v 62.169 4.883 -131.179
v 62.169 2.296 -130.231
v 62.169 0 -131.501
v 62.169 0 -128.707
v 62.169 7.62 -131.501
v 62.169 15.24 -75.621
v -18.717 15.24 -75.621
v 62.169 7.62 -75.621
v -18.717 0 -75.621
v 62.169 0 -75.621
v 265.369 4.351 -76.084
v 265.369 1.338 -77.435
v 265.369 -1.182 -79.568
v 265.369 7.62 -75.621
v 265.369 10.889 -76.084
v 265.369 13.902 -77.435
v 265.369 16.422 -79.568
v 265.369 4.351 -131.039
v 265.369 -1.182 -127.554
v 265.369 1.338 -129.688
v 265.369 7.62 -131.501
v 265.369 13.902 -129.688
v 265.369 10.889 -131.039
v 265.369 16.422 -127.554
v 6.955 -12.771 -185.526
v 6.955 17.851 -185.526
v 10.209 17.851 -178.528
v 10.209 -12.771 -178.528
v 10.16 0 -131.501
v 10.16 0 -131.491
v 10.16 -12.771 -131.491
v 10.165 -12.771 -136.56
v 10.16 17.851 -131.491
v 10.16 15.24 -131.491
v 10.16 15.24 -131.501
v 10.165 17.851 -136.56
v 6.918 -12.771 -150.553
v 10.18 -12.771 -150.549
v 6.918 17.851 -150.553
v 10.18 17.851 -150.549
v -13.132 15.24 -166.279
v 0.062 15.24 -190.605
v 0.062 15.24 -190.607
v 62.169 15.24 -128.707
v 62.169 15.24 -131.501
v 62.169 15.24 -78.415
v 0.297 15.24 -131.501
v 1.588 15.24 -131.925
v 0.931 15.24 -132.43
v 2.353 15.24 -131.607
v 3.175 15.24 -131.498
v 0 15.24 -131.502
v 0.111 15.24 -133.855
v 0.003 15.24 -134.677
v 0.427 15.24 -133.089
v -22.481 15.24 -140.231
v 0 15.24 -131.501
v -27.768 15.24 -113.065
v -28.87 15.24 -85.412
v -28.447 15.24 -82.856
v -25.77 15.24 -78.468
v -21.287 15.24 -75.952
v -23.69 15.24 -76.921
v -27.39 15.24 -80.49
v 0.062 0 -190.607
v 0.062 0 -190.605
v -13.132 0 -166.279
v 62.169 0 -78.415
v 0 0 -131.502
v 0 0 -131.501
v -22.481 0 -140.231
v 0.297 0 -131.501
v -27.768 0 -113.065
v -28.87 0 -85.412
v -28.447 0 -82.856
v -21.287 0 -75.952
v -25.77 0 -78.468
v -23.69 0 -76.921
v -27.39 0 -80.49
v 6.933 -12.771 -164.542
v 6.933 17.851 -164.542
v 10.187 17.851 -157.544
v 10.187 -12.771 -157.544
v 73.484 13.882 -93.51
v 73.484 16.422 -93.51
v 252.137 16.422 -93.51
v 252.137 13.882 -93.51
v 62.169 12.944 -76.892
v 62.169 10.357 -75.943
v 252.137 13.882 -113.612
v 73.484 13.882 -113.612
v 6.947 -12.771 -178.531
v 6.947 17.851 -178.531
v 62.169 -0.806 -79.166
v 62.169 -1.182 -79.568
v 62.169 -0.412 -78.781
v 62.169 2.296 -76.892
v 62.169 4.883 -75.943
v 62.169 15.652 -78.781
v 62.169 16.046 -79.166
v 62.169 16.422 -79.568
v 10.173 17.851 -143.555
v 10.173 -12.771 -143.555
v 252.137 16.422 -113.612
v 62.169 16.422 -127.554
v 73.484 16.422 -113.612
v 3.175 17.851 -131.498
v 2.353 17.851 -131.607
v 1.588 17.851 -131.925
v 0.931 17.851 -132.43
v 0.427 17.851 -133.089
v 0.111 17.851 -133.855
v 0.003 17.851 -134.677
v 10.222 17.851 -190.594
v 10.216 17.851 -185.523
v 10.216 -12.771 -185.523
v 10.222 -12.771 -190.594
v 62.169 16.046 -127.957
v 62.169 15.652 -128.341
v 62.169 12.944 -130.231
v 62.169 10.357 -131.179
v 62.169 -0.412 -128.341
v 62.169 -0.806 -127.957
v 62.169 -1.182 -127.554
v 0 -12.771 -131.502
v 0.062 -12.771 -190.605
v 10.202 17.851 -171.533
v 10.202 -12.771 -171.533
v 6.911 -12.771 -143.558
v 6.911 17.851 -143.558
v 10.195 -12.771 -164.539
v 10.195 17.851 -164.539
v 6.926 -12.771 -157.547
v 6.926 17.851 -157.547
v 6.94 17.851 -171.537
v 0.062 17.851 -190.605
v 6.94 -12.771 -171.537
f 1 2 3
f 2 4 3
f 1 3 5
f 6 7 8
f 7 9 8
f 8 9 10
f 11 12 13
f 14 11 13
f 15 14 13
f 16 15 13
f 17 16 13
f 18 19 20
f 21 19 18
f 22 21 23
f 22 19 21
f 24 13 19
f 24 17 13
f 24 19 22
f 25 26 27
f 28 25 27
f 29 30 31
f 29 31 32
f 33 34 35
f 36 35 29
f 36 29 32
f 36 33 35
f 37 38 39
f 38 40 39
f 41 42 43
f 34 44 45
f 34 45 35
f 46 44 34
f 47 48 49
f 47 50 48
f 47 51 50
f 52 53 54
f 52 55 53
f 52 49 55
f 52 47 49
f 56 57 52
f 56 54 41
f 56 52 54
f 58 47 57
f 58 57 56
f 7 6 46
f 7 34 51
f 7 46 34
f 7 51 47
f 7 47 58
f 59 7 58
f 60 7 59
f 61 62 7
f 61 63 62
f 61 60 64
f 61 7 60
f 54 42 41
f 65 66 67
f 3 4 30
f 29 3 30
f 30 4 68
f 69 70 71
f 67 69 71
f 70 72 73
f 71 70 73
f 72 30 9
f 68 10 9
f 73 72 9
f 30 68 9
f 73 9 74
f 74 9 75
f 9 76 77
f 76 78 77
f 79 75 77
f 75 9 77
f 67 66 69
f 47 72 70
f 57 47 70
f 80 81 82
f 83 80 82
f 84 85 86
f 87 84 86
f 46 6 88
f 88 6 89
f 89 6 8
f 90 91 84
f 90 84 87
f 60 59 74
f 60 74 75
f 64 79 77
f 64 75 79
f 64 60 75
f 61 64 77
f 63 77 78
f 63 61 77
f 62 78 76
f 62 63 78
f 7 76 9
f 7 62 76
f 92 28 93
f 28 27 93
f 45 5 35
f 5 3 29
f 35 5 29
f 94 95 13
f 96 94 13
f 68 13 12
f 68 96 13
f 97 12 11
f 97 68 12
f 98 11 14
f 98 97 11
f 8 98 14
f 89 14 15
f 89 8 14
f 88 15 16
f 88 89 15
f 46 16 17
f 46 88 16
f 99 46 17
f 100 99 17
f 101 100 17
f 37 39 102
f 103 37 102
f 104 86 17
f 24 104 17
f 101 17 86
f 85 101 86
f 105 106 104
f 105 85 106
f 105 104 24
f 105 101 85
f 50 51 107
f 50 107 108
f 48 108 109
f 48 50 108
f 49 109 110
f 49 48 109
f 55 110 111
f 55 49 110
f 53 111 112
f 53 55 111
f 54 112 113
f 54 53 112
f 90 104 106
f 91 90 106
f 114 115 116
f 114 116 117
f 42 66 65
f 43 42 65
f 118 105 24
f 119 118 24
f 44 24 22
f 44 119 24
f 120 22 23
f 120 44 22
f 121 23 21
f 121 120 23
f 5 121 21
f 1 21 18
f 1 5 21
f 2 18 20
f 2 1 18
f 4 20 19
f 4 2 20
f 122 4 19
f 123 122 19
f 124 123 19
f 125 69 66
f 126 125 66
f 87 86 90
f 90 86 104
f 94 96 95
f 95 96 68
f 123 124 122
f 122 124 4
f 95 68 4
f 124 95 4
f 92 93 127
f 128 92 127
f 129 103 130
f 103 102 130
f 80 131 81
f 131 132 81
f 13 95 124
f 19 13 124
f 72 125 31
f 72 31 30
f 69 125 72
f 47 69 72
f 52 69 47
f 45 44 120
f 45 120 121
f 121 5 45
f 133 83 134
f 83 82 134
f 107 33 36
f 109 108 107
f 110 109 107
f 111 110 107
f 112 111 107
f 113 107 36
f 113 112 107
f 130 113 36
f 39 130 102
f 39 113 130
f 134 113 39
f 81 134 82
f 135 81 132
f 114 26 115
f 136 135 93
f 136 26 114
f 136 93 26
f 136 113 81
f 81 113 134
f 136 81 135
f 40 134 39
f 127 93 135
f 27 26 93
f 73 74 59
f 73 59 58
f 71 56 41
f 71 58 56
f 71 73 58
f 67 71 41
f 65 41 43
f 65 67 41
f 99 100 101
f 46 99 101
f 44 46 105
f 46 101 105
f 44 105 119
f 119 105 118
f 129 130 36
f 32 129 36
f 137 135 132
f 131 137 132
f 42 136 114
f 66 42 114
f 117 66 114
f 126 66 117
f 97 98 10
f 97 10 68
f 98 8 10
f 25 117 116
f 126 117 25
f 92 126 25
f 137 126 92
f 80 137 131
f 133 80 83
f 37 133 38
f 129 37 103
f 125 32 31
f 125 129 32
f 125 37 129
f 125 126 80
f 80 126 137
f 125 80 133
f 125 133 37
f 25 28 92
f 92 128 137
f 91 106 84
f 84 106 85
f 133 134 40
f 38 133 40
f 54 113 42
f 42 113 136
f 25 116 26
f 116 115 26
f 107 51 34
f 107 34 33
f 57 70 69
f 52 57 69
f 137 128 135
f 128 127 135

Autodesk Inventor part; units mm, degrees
ref_plane "YZ Plane" through (0, 0, 0) normal (1, 0, 0) x (0, 1, 0)
ref_plane "XZ Plane" through (0, 0, 0) normal (0, 1, 0) x (-1, 0, 0)
ref_plane "XY Plane" through (0, 0, 0) normal (0, 0, 1) x (1, 0, 0)
sketch "Sketch1" plane through (0, 0, 0) normal (0, 1, 0) x (-1, 0, 0)
  line L0 (0, -131.5012) -> (-0.0617, -190.607)
  line L1 (-41.7658, -131.5012) -> (53.7037, -131.5012) construction
  line L2 (28.2495, -75.6212) -> (-41.7658, -75.6212)
  arc A0 (-0.0617, -190.607) -> (28.2495, -75.6212) centre (-152.8189, -92.0177) ccw
  line L3 (28.2495, -75.6212) -> (-62.1692, -75.6212)
  line L4 (-62.1692, -75.6212) -> (-62.1692, -131.5012)
  line L5 (-62.1692, -131.5012) -> (0, -131.5012)
  point P0 (0, 0)
  point P1 (8.9112, -179.6369)
  point P2 (0, -75.6212)
  point P3 (-70.1734, -131.5012)
  dimension "d21" = 59.1058
  dimension "d37" = 70.0153
extrude "Extrusion1" add sketch "Sketch1" along normal blind 15.24
fillet "Fillet1" radius 10.16 1 edges at (-28.2495, 7.62, -75.6212)
sketch "Sketch4" plane through (0.0191, 12.7, -149.7788) normal (0.9999995, 0, 0.0010447) x (0.0010447, 0, -0.9999995)
  line L0 (0, -22.86) -> (0, 2.54)
  line L1 (15.9389, 2.54) -> (13.4561, 2.54) construction
  line L2 (13.4561, 2.54) -> (13.4561, 4.185) construction
  line L3 (13.6464, 2.54) -> (33.02, 2.54)
  line L4 (33.02, -22.86) -> (13.6464, -22.86)
  line L5 (-10.4713, -22.86) -> (-10.4713, 2.54) construction
  line L6 (-10.4713, -10.16) -> (33.02, -10.16) construction
  line L7 (-10.4713, -10.16) -> (11.2743, -10.16) construction
  line L8 (-18.2773, 5.1507) -> (40.826, 5.1507)
  line L9 (40.826, 5.1507) -> (40.826, -25.4707)
  line L10 (40.826, -25.4707) -> (-18.2773, -25.4707)
  line L11 (-18.2773, -25.4707) -> (-18.2773, 5.1507)
  line L12 (-18.2773, 5.1507) -> (40.826, -25.4707) construction
  line L13 (40.826, 5.1507) -> (-18.2773, -25.4707) construction
  point P0 (8.89, -10.16)
  dimension "d24" = 43.4913
  dimension "d23" = 21.7457
extrude "Extrusion4" add sketch "Sketch4" along normal blind 10.16
sketch "Sketch5" plane through (0, 17.8507, -131.5015) normal (0, 1, 0) x (0.9999995, 0, 0.0010447)
  line L0 (10.16, 0) -> (10.16, 59.1033) projected
  line L1 (10.16, 0) -> (10.16, 4.6168)
  line L2 (10.16, 0) -> (10.16, 6.604)
  line L3 (10.16, 59.1033) -> (10.16, 54.0318)
  line L4 (10.16, 54.0318) -> (6.8983, 54.0318)
  line L5 (6.8983, 54.0318) -> (10.16, 47.0371)
  line L6 (10.16, 3.5366) -> (10.16, 0)
  line L7 (10.16, 54.0318) -> (10.16, 59.1033)
  line L8 (10.16, 47.0371) -> (6.8983, 47.0371)
  line L9 (6.8983, 47.0371) -> (10.16, 40.0424)
  line L10 (10.16, 40.0424) -> (6.8983, 40.0424)
  line L11 (6.8983, 40.0424) -> (10.16, 33.0478)
  line L12 (10.16, 33.0478) -> (6.8983, 33.0478)
  line L13 (6.8983, 33.0478) -> (10.16, 26.0531)
  line L14 (10.16, 26.0531) -> (6.8983, 26.0531)
  line L15 (6.8983, 26.0531) -> (10.16, 19.0584)
  line L16 (10.16, 19.0584) -> (6.8983, 19.0584)
  line L17 (6.8983, 19.0584) -> (10.16, 12.0637)
  line L18 (10.16, 12.0637) -> (6.8983, 12.0637)
  line L19 (6.8983, 12.0637) -> (10.16, 5.0691)
  line L20 (10.16, 5.0691) -> (10.16, 54.0318)
  point P0 (-241.3, 27.1673)
  dimension "d30" = 5.0715
  dimension "d28" = 65
  dimension "d29" = 6.9947
extrude "Extrusion5" cut sketch "Sketch5" against normal through all
fillet "Fillet3" radius 3.175 1 edges at (0, 16.5453, -131.5015)
sketch "Sketch7" plane through (62.1692, 0, -75.6212) normal (1, 0, 0) x (0, 0, -1)
  line L0 (0, 15.24) -> (55.88, 15.24) projected
  line L1 (55.88, 0) -> (27.2823, 0)
  line L2 (27.94, 0) -> (41.91, 0) construction
  line L3 (55.88, 0) -> (55.88, 15.24) projected
  line L4 (55.88, 0) -> (27.94, 0)
  line L5 (9.7909, 0) -> (0, 0) projected
  line L6 (27.94, 0) -> (27.94, 15.24)
  line L7 (27.94, 15.24) -> (53.086, 15.24)
  line L8 (114.9858, 15.24) -> (9.7909, 15.24) projected
  arc A0 (51.9331, -1.1819) -> (51.9331, 16.4219) centre (44.0921, 7.62) ccw
  line L9 (51.9331, 16.4219) -> (51.9331, -1.1819) construction
  line L10 (51.9331, 16.4219) -> (69.5369, 16.4219) construction
  arc A1 (3.9469, 16.4219) -> (3.9469, -1.1819) centre (11.7879, 7.62) ccw
  line L11 (3.9469, 16.4219) -> (51.9331, 16.4219)
  line L12 (3.9469, -1.1819) -> (51.9331, -1.1819)
  point P0 (-75.6212, 0)
  dimension "d43" = 27.94
  dimension "d44" = 25.146
  dimension "d45" = 90
  dimension "d56" = 17.6038
extrude "Extrusion6" add sketch "Sketch7" along normal blind 203.2 contours L0 A1 L11 A0 | L0 L6 L1 A0 L12 A1 | L0 A0 L1 L6
sketch "Sketch8" plane through (62.1692, 16.4219, -79.5681) normal (0, 1, 0) x (1, 0, 0)
  line L0 (203.2, 47.9862) -> (203.2, 0) construction
  line L1 (203.2, 23.9931) -> (-91.0395, 23.9931) construction
  arc A0 (-62.1075, 111.0389) -> (-91.0395, 5.8439) centre (90.6496, 12.4496) ccw construction
  line L2 (-91.0395, 5.8439) -> (-91.0395, 27.6375) construction
  line L3 (-91.0395, 5.8439) -> (-69.2459, 5.8439) construction
  line L4 (203.2, 0) -> (56.0832, 0) construction
  line L5 (0, 0) -> (203.2, 0) construction
  line L6 (56.0832, 0) -> (56.0832, 60.6628) construction
  line L7 (-77.8013, 6.5731) -> (189.9677, 41.4131) construction
  line L8 (189.9677, 6.5731) -> (-77.8013, 41.4131) construction
  line L9 (11.3147, 13.9418) -> (189.9677, 13.9418)
  line L10 (189.9677, 13.9418) -> (189.9677, 34.0444)
  line L11 (189.9677, 34.0444) -> (11.3147, 34.0444)
  line L12 (11.3147, 34.0444) -> (11.3147, 13.9418)
  line L13 (11.3147, 13.9418) -> (189.9677, 34.0444) construction
  line L14 (189.9677, 13.9418) -> (11.3147, 34.0444) construction
  point P0 (-62.1692, -79.5681)
  point P1 (56.0832, 23.9931)
  point P2 (100.6412, 23.9931)
  dimension "d48" = 90
  dimension "d50" = 147.1168
extrude "Extrusion7" cut sketch "Sketch8" against normal blind 2.54
properties part number "Top"
